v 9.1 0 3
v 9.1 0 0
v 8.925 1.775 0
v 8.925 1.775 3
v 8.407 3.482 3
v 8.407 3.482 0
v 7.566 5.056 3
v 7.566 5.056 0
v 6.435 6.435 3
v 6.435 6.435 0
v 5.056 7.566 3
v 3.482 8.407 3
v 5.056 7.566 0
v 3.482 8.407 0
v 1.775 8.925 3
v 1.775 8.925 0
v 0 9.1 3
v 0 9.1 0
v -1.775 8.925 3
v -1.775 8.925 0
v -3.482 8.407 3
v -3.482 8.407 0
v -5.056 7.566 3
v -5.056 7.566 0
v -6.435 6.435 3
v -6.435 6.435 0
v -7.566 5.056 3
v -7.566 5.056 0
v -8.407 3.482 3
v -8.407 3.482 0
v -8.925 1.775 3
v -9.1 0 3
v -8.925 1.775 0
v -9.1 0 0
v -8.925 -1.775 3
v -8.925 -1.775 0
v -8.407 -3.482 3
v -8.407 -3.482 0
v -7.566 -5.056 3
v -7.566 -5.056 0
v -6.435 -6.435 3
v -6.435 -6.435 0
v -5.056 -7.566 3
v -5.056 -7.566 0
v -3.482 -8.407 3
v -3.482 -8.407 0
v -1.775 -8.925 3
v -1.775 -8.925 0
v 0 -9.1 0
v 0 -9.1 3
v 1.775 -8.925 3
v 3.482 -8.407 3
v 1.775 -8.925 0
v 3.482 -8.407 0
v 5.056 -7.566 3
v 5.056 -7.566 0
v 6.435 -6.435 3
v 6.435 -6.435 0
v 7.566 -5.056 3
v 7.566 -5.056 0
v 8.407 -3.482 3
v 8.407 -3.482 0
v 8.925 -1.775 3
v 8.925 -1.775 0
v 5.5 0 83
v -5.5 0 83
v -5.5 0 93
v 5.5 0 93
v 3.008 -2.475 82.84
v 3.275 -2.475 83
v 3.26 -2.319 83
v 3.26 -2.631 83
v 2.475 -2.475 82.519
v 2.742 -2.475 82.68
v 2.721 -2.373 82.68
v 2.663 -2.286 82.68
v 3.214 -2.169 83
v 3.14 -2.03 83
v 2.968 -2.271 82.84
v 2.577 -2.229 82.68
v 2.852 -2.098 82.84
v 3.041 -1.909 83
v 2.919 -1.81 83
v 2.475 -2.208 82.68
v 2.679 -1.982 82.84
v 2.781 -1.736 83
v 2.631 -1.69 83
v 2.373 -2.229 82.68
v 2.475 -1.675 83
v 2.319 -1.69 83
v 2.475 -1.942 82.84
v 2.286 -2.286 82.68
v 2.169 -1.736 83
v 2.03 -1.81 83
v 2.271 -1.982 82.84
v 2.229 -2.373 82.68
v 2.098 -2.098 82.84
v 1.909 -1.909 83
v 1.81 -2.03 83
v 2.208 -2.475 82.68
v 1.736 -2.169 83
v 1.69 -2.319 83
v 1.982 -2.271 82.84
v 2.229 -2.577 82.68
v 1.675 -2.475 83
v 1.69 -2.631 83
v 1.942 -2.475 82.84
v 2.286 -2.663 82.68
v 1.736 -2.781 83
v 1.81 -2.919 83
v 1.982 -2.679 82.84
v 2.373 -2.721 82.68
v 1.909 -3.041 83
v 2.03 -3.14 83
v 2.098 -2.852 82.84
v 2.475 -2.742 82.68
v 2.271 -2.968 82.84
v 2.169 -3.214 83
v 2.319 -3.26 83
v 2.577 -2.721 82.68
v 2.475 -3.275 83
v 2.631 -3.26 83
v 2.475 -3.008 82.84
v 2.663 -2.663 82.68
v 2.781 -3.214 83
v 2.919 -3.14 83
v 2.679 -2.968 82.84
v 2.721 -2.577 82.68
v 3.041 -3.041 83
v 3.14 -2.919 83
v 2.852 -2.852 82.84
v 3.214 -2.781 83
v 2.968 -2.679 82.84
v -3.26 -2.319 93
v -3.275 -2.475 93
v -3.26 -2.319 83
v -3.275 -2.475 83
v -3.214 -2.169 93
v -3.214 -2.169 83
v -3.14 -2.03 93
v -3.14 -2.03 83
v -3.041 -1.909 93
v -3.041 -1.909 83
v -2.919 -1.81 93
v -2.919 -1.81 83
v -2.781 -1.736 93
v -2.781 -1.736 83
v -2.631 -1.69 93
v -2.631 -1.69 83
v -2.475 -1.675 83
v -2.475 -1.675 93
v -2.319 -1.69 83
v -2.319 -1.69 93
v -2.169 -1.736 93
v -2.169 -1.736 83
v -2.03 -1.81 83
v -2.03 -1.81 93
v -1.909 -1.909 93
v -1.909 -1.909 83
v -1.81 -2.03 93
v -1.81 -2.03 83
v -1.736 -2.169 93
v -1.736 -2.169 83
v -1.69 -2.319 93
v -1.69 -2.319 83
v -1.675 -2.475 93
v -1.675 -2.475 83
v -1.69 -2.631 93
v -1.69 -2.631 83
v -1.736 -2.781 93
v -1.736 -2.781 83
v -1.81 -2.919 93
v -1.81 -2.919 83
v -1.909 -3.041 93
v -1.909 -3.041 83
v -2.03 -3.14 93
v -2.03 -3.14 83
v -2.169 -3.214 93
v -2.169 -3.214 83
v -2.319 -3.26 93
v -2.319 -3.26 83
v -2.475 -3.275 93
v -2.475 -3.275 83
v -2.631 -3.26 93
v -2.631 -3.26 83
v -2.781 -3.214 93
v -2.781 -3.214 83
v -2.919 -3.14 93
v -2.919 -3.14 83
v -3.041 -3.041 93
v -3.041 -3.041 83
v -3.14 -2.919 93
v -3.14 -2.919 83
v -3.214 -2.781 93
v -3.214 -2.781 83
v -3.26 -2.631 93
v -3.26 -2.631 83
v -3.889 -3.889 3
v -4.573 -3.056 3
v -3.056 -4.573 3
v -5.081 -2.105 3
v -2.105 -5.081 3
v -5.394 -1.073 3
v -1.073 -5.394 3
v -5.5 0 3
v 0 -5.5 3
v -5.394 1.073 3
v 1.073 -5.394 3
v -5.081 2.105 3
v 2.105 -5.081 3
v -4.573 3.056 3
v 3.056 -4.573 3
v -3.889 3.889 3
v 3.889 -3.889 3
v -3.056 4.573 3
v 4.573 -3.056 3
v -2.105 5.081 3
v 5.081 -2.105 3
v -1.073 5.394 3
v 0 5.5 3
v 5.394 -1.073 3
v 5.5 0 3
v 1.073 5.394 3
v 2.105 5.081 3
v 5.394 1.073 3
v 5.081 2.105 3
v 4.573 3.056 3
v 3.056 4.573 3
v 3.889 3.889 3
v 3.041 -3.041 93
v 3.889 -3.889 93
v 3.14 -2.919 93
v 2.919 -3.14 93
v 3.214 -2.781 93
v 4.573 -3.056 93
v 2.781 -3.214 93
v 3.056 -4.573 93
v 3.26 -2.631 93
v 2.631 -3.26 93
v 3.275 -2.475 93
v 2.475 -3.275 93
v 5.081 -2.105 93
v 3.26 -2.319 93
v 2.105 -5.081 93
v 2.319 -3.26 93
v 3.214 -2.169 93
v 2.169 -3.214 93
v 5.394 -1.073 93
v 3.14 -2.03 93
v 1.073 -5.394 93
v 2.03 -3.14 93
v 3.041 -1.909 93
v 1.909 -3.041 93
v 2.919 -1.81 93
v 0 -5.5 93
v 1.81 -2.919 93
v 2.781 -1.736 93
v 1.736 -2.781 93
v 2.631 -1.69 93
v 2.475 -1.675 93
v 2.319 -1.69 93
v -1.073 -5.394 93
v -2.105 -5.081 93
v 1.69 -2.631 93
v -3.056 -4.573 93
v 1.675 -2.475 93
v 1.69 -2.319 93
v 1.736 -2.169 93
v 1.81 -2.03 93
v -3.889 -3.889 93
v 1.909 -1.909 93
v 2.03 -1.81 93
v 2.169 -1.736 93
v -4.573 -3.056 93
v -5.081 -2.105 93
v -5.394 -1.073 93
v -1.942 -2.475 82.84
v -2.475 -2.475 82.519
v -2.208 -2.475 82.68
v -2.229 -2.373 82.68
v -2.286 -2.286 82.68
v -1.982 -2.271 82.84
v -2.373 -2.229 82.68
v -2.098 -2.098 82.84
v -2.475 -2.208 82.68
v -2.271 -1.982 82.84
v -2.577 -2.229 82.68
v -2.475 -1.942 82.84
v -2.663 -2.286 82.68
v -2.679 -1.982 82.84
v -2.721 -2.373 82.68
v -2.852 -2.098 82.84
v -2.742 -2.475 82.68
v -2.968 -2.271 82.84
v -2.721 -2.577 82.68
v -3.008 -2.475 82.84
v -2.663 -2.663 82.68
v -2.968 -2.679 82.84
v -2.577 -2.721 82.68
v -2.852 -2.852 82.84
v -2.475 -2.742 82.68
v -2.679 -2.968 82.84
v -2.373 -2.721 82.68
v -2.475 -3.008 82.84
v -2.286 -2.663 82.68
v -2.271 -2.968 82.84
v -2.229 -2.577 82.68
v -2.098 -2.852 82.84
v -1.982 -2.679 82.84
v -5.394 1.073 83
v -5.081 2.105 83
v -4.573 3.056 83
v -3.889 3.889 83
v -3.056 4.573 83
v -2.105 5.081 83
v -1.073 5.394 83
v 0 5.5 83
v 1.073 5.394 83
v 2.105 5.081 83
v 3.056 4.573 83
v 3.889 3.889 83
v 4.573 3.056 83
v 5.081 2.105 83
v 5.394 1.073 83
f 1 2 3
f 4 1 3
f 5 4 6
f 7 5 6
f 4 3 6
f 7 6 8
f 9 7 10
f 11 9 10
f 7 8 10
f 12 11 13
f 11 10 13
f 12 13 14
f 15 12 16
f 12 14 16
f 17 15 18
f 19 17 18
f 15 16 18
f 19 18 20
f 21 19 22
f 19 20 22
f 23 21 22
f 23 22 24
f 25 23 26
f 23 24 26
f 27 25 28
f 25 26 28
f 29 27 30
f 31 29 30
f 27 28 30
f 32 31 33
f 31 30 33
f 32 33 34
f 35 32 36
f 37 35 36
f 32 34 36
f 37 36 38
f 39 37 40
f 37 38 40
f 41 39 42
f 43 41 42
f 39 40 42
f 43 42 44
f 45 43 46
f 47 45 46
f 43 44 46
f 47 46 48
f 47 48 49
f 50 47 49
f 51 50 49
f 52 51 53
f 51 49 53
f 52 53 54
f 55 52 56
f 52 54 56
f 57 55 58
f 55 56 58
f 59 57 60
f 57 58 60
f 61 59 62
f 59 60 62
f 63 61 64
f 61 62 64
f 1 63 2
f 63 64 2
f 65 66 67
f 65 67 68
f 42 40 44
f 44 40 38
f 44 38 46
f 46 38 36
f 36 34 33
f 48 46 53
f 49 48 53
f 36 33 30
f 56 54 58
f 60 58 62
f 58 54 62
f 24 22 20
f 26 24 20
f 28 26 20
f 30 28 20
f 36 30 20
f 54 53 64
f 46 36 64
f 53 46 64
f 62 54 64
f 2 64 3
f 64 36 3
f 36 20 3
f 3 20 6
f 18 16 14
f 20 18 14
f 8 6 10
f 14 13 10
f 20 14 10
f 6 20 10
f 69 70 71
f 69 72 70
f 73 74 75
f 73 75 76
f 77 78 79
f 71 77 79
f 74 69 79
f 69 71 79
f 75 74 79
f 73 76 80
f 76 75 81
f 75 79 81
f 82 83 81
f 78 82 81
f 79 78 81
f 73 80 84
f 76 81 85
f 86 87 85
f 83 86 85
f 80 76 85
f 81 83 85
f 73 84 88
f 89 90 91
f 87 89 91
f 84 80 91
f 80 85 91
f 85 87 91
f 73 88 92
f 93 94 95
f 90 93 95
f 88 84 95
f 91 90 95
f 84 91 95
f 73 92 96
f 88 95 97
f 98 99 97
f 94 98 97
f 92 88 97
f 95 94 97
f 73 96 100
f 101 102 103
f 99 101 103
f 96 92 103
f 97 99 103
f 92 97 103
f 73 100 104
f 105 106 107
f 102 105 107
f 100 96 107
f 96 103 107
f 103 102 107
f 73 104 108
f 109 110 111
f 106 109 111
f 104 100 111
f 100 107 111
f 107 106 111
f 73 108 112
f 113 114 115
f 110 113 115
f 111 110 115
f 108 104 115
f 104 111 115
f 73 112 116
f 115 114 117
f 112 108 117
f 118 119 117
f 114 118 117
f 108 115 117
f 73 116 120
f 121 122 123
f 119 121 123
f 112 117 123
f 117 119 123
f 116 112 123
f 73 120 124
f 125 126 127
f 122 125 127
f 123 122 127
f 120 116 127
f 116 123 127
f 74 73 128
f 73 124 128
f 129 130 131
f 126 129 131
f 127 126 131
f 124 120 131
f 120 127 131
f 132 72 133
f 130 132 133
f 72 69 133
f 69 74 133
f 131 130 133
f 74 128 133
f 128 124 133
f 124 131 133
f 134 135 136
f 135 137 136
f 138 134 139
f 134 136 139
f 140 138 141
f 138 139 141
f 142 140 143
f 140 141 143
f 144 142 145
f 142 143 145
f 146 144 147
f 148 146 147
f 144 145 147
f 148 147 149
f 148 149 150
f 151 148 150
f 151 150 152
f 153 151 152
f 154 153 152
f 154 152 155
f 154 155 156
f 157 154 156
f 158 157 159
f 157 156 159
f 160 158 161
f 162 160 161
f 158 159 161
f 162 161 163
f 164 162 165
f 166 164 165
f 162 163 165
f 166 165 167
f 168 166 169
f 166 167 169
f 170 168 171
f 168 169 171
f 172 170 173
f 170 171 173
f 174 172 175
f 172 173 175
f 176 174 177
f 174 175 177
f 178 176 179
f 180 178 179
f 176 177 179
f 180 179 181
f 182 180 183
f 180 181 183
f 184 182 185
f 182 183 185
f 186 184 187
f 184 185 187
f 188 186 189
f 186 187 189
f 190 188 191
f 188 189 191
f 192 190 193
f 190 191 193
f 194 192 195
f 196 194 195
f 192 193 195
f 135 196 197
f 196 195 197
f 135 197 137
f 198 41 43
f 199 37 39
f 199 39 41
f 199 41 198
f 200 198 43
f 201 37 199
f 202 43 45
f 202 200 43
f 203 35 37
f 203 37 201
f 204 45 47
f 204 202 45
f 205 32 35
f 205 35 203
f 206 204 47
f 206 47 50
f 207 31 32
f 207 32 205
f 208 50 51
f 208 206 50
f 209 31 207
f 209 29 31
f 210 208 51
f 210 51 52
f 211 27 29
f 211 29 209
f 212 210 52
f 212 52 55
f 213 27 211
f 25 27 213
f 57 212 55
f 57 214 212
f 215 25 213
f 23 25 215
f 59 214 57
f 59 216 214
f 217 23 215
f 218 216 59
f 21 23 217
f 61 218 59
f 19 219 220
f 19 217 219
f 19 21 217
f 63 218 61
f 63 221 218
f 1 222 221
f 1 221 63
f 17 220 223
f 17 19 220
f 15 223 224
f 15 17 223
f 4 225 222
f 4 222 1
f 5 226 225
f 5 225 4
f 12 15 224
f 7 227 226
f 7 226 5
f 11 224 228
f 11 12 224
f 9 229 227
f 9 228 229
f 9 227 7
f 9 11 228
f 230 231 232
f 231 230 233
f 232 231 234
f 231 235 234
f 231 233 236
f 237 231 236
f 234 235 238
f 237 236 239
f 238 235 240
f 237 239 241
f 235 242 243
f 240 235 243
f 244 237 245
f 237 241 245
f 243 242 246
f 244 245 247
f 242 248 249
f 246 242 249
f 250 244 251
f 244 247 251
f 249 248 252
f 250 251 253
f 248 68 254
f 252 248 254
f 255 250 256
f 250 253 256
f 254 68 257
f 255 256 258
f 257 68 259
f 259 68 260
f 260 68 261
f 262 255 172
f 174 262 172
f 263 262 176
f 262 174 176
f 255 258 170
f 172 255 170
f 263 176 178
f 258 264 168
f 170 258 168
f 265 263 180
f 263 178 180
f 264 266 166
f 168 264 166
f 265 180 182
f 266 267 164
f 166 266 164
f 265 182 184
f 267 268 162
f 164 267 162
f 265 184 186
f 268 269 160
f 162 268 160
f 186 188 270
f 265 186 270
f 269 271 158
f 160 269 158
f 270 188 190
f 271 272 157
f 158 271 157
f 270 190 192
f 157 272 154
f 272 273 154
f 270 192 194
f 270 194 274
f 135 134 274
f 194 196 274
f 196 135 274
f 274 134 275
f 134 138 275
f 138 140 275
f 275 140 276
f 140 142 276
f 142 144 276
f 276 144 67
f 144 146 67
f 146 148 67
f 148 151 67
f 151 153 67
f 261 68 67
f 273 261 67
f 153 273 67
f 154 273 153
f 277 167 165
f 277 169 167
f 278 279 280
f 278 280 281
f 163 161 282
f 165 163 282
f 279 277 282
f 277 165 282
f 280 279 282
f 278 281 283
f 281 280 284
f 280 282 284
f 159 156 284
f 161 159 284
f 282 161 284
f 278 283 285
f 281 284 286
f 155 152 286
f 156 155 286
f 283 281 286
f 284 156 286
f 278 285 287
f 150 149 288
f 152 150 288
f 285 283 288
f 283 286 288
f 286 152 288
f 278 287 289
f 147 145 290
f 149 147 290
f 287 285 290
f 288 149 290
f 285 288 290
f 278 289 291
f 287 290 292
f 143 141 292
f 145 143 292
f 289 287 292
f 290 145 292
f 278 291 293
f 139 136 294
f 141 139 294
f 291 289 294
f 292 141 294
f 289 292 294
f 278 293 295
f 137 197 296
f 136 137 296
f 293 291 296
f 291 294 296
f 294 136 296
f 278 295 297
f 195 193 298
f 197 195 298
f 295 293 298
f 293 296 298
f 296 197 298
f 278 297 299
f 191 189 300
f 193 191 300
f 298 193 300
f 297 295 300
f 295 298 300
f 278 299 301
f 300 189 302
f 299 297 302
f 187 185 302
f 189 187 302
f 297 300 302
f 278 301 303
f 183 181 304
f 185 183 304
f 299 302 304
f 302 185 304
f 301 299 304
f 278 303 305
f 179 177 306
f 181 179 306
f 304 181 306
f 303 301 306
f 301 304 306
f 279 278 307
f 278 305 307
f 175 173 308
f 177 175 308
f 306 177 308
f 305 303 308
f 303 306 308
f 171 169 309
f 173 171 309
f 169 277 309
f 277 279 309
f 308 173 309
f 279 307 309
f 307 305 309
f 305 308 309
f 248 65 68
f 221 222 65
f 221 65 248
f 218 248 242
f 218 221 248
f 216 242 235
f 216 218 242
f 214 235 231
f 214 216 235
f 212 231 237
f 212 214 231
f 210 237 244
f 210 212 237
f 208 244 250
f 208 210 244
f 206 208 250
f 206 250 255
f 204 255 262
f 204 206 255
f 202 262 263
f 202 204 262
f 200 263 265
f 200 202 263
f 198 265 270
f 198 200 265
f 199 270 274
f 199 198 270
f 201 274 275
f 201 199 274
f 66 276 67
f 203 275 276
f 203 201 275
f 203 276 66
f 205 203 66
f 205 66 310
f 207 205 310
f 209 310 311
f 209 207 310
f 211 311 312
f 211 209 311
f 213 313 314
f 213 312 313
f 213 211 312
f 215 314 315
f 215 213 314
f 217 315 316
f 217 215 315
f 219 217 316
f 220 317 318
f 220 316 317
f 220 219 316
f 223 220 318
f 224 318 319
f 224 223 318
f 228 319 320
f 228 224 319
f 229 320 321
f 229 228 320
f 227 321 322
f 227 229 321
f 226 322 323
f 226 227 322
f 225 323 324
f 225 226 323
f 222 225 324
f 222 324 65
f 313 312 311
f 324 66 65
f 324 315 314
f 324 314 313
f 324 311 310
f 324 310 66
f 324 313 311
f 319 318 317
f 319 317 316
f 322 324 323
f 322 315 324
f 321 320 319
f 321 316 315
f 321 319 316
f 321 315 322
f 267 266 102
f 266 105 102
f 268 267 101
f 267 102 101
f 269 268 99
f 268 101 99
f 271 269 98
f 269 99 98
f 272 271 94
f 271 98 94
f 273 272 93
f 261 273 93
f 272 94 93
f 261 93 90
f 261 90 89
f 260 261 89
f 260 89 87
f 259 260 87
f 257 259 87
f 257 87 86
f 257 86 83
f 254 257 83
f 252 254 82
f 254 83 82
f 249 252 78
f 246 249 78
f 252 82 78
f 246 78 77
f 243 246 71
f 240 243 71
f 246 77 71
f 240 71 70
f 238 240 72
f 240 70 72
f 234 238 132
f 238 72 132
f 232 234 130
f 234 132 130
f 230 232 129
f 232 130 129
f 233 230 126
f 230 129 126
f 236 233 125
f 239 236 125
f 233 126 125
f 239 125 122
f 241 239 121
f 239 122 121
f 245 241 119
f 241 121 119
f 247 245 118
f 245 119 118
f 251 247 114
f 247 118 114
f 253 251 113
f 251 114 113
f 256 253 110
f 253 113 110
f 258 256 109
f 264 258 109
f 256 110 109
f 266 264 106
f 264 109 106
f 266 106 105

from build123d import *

# Parameters (mm, degrees)
ESBO_O1_R                 = 9.1
RESSALTO_EXTRUS_O1_DEPTH  = 3
ESBO_O2_R                 = 5.5
RESSALTO_EXTRUS_O2_DEPTH  = 80
RESSALTO_EXTRUS_O3_DEPTH  = 10
FURO_ROSCADO_DE_M21_D     = 1.6
FURO_ROSCADO_DE_M21_DEPTH = 10
FURO_ROSCADO_DE_M21_TIP   = 0.480688495


with BuildPart() as part:
    # Esboço1 → Ressalto-extrusão1 (new body)
    with BuildSketch(Plane.XY):
        Circle(ESBO_O1_R)
    extrude(amount=RESSALTO_EXTRUS_O1_DEPTH)

    # Esboço2 → Ressalto-extrusão2 (add)
    with BuildSketch(Plane.XY.offset(3)):
        Circle(ESBO_O2_R)
    extrude(amount=RESSALTO_EXTRUS_O2_DEPTH)

    # Esboço3 → Ressalto-extrusão3 (add)
    with BuildSketch(Plane.XY.offset(83)):
        with BuildLine():
            Line((-5.5, 0), (5.5, 0))
            ThreePointArc((5.5, 0), (0, -5.5), (-5.5, 0))
        make_face()
    extrude(amount=RESSALTO_EXTRUS_O3_DEPTH)

    # Furo roscado de M21
    with Locations(Plane.XY.offset(93)):
        with Locations((-2.474873734, -2.474873734), (2.474873734, -2.474873734)):
            Hole(FURO_ROSCADO_DE_M21_D / 2, depth=FURO_ROSCADO_DE_M21_DEPTH)
            with Locations((0, 0, -(FURO_ROSCADO_DE_M21_DEPTH + FURO_ROSCADO_DE_M21_TIP / 2))):  # 118° drill point
                Cone(0, FURO_ROSCADO_DE_M21_D / 2, FURO_ROSCADO_DE_M21_TIP, mode=Mode.SUBTRACT)


solid = part.part
